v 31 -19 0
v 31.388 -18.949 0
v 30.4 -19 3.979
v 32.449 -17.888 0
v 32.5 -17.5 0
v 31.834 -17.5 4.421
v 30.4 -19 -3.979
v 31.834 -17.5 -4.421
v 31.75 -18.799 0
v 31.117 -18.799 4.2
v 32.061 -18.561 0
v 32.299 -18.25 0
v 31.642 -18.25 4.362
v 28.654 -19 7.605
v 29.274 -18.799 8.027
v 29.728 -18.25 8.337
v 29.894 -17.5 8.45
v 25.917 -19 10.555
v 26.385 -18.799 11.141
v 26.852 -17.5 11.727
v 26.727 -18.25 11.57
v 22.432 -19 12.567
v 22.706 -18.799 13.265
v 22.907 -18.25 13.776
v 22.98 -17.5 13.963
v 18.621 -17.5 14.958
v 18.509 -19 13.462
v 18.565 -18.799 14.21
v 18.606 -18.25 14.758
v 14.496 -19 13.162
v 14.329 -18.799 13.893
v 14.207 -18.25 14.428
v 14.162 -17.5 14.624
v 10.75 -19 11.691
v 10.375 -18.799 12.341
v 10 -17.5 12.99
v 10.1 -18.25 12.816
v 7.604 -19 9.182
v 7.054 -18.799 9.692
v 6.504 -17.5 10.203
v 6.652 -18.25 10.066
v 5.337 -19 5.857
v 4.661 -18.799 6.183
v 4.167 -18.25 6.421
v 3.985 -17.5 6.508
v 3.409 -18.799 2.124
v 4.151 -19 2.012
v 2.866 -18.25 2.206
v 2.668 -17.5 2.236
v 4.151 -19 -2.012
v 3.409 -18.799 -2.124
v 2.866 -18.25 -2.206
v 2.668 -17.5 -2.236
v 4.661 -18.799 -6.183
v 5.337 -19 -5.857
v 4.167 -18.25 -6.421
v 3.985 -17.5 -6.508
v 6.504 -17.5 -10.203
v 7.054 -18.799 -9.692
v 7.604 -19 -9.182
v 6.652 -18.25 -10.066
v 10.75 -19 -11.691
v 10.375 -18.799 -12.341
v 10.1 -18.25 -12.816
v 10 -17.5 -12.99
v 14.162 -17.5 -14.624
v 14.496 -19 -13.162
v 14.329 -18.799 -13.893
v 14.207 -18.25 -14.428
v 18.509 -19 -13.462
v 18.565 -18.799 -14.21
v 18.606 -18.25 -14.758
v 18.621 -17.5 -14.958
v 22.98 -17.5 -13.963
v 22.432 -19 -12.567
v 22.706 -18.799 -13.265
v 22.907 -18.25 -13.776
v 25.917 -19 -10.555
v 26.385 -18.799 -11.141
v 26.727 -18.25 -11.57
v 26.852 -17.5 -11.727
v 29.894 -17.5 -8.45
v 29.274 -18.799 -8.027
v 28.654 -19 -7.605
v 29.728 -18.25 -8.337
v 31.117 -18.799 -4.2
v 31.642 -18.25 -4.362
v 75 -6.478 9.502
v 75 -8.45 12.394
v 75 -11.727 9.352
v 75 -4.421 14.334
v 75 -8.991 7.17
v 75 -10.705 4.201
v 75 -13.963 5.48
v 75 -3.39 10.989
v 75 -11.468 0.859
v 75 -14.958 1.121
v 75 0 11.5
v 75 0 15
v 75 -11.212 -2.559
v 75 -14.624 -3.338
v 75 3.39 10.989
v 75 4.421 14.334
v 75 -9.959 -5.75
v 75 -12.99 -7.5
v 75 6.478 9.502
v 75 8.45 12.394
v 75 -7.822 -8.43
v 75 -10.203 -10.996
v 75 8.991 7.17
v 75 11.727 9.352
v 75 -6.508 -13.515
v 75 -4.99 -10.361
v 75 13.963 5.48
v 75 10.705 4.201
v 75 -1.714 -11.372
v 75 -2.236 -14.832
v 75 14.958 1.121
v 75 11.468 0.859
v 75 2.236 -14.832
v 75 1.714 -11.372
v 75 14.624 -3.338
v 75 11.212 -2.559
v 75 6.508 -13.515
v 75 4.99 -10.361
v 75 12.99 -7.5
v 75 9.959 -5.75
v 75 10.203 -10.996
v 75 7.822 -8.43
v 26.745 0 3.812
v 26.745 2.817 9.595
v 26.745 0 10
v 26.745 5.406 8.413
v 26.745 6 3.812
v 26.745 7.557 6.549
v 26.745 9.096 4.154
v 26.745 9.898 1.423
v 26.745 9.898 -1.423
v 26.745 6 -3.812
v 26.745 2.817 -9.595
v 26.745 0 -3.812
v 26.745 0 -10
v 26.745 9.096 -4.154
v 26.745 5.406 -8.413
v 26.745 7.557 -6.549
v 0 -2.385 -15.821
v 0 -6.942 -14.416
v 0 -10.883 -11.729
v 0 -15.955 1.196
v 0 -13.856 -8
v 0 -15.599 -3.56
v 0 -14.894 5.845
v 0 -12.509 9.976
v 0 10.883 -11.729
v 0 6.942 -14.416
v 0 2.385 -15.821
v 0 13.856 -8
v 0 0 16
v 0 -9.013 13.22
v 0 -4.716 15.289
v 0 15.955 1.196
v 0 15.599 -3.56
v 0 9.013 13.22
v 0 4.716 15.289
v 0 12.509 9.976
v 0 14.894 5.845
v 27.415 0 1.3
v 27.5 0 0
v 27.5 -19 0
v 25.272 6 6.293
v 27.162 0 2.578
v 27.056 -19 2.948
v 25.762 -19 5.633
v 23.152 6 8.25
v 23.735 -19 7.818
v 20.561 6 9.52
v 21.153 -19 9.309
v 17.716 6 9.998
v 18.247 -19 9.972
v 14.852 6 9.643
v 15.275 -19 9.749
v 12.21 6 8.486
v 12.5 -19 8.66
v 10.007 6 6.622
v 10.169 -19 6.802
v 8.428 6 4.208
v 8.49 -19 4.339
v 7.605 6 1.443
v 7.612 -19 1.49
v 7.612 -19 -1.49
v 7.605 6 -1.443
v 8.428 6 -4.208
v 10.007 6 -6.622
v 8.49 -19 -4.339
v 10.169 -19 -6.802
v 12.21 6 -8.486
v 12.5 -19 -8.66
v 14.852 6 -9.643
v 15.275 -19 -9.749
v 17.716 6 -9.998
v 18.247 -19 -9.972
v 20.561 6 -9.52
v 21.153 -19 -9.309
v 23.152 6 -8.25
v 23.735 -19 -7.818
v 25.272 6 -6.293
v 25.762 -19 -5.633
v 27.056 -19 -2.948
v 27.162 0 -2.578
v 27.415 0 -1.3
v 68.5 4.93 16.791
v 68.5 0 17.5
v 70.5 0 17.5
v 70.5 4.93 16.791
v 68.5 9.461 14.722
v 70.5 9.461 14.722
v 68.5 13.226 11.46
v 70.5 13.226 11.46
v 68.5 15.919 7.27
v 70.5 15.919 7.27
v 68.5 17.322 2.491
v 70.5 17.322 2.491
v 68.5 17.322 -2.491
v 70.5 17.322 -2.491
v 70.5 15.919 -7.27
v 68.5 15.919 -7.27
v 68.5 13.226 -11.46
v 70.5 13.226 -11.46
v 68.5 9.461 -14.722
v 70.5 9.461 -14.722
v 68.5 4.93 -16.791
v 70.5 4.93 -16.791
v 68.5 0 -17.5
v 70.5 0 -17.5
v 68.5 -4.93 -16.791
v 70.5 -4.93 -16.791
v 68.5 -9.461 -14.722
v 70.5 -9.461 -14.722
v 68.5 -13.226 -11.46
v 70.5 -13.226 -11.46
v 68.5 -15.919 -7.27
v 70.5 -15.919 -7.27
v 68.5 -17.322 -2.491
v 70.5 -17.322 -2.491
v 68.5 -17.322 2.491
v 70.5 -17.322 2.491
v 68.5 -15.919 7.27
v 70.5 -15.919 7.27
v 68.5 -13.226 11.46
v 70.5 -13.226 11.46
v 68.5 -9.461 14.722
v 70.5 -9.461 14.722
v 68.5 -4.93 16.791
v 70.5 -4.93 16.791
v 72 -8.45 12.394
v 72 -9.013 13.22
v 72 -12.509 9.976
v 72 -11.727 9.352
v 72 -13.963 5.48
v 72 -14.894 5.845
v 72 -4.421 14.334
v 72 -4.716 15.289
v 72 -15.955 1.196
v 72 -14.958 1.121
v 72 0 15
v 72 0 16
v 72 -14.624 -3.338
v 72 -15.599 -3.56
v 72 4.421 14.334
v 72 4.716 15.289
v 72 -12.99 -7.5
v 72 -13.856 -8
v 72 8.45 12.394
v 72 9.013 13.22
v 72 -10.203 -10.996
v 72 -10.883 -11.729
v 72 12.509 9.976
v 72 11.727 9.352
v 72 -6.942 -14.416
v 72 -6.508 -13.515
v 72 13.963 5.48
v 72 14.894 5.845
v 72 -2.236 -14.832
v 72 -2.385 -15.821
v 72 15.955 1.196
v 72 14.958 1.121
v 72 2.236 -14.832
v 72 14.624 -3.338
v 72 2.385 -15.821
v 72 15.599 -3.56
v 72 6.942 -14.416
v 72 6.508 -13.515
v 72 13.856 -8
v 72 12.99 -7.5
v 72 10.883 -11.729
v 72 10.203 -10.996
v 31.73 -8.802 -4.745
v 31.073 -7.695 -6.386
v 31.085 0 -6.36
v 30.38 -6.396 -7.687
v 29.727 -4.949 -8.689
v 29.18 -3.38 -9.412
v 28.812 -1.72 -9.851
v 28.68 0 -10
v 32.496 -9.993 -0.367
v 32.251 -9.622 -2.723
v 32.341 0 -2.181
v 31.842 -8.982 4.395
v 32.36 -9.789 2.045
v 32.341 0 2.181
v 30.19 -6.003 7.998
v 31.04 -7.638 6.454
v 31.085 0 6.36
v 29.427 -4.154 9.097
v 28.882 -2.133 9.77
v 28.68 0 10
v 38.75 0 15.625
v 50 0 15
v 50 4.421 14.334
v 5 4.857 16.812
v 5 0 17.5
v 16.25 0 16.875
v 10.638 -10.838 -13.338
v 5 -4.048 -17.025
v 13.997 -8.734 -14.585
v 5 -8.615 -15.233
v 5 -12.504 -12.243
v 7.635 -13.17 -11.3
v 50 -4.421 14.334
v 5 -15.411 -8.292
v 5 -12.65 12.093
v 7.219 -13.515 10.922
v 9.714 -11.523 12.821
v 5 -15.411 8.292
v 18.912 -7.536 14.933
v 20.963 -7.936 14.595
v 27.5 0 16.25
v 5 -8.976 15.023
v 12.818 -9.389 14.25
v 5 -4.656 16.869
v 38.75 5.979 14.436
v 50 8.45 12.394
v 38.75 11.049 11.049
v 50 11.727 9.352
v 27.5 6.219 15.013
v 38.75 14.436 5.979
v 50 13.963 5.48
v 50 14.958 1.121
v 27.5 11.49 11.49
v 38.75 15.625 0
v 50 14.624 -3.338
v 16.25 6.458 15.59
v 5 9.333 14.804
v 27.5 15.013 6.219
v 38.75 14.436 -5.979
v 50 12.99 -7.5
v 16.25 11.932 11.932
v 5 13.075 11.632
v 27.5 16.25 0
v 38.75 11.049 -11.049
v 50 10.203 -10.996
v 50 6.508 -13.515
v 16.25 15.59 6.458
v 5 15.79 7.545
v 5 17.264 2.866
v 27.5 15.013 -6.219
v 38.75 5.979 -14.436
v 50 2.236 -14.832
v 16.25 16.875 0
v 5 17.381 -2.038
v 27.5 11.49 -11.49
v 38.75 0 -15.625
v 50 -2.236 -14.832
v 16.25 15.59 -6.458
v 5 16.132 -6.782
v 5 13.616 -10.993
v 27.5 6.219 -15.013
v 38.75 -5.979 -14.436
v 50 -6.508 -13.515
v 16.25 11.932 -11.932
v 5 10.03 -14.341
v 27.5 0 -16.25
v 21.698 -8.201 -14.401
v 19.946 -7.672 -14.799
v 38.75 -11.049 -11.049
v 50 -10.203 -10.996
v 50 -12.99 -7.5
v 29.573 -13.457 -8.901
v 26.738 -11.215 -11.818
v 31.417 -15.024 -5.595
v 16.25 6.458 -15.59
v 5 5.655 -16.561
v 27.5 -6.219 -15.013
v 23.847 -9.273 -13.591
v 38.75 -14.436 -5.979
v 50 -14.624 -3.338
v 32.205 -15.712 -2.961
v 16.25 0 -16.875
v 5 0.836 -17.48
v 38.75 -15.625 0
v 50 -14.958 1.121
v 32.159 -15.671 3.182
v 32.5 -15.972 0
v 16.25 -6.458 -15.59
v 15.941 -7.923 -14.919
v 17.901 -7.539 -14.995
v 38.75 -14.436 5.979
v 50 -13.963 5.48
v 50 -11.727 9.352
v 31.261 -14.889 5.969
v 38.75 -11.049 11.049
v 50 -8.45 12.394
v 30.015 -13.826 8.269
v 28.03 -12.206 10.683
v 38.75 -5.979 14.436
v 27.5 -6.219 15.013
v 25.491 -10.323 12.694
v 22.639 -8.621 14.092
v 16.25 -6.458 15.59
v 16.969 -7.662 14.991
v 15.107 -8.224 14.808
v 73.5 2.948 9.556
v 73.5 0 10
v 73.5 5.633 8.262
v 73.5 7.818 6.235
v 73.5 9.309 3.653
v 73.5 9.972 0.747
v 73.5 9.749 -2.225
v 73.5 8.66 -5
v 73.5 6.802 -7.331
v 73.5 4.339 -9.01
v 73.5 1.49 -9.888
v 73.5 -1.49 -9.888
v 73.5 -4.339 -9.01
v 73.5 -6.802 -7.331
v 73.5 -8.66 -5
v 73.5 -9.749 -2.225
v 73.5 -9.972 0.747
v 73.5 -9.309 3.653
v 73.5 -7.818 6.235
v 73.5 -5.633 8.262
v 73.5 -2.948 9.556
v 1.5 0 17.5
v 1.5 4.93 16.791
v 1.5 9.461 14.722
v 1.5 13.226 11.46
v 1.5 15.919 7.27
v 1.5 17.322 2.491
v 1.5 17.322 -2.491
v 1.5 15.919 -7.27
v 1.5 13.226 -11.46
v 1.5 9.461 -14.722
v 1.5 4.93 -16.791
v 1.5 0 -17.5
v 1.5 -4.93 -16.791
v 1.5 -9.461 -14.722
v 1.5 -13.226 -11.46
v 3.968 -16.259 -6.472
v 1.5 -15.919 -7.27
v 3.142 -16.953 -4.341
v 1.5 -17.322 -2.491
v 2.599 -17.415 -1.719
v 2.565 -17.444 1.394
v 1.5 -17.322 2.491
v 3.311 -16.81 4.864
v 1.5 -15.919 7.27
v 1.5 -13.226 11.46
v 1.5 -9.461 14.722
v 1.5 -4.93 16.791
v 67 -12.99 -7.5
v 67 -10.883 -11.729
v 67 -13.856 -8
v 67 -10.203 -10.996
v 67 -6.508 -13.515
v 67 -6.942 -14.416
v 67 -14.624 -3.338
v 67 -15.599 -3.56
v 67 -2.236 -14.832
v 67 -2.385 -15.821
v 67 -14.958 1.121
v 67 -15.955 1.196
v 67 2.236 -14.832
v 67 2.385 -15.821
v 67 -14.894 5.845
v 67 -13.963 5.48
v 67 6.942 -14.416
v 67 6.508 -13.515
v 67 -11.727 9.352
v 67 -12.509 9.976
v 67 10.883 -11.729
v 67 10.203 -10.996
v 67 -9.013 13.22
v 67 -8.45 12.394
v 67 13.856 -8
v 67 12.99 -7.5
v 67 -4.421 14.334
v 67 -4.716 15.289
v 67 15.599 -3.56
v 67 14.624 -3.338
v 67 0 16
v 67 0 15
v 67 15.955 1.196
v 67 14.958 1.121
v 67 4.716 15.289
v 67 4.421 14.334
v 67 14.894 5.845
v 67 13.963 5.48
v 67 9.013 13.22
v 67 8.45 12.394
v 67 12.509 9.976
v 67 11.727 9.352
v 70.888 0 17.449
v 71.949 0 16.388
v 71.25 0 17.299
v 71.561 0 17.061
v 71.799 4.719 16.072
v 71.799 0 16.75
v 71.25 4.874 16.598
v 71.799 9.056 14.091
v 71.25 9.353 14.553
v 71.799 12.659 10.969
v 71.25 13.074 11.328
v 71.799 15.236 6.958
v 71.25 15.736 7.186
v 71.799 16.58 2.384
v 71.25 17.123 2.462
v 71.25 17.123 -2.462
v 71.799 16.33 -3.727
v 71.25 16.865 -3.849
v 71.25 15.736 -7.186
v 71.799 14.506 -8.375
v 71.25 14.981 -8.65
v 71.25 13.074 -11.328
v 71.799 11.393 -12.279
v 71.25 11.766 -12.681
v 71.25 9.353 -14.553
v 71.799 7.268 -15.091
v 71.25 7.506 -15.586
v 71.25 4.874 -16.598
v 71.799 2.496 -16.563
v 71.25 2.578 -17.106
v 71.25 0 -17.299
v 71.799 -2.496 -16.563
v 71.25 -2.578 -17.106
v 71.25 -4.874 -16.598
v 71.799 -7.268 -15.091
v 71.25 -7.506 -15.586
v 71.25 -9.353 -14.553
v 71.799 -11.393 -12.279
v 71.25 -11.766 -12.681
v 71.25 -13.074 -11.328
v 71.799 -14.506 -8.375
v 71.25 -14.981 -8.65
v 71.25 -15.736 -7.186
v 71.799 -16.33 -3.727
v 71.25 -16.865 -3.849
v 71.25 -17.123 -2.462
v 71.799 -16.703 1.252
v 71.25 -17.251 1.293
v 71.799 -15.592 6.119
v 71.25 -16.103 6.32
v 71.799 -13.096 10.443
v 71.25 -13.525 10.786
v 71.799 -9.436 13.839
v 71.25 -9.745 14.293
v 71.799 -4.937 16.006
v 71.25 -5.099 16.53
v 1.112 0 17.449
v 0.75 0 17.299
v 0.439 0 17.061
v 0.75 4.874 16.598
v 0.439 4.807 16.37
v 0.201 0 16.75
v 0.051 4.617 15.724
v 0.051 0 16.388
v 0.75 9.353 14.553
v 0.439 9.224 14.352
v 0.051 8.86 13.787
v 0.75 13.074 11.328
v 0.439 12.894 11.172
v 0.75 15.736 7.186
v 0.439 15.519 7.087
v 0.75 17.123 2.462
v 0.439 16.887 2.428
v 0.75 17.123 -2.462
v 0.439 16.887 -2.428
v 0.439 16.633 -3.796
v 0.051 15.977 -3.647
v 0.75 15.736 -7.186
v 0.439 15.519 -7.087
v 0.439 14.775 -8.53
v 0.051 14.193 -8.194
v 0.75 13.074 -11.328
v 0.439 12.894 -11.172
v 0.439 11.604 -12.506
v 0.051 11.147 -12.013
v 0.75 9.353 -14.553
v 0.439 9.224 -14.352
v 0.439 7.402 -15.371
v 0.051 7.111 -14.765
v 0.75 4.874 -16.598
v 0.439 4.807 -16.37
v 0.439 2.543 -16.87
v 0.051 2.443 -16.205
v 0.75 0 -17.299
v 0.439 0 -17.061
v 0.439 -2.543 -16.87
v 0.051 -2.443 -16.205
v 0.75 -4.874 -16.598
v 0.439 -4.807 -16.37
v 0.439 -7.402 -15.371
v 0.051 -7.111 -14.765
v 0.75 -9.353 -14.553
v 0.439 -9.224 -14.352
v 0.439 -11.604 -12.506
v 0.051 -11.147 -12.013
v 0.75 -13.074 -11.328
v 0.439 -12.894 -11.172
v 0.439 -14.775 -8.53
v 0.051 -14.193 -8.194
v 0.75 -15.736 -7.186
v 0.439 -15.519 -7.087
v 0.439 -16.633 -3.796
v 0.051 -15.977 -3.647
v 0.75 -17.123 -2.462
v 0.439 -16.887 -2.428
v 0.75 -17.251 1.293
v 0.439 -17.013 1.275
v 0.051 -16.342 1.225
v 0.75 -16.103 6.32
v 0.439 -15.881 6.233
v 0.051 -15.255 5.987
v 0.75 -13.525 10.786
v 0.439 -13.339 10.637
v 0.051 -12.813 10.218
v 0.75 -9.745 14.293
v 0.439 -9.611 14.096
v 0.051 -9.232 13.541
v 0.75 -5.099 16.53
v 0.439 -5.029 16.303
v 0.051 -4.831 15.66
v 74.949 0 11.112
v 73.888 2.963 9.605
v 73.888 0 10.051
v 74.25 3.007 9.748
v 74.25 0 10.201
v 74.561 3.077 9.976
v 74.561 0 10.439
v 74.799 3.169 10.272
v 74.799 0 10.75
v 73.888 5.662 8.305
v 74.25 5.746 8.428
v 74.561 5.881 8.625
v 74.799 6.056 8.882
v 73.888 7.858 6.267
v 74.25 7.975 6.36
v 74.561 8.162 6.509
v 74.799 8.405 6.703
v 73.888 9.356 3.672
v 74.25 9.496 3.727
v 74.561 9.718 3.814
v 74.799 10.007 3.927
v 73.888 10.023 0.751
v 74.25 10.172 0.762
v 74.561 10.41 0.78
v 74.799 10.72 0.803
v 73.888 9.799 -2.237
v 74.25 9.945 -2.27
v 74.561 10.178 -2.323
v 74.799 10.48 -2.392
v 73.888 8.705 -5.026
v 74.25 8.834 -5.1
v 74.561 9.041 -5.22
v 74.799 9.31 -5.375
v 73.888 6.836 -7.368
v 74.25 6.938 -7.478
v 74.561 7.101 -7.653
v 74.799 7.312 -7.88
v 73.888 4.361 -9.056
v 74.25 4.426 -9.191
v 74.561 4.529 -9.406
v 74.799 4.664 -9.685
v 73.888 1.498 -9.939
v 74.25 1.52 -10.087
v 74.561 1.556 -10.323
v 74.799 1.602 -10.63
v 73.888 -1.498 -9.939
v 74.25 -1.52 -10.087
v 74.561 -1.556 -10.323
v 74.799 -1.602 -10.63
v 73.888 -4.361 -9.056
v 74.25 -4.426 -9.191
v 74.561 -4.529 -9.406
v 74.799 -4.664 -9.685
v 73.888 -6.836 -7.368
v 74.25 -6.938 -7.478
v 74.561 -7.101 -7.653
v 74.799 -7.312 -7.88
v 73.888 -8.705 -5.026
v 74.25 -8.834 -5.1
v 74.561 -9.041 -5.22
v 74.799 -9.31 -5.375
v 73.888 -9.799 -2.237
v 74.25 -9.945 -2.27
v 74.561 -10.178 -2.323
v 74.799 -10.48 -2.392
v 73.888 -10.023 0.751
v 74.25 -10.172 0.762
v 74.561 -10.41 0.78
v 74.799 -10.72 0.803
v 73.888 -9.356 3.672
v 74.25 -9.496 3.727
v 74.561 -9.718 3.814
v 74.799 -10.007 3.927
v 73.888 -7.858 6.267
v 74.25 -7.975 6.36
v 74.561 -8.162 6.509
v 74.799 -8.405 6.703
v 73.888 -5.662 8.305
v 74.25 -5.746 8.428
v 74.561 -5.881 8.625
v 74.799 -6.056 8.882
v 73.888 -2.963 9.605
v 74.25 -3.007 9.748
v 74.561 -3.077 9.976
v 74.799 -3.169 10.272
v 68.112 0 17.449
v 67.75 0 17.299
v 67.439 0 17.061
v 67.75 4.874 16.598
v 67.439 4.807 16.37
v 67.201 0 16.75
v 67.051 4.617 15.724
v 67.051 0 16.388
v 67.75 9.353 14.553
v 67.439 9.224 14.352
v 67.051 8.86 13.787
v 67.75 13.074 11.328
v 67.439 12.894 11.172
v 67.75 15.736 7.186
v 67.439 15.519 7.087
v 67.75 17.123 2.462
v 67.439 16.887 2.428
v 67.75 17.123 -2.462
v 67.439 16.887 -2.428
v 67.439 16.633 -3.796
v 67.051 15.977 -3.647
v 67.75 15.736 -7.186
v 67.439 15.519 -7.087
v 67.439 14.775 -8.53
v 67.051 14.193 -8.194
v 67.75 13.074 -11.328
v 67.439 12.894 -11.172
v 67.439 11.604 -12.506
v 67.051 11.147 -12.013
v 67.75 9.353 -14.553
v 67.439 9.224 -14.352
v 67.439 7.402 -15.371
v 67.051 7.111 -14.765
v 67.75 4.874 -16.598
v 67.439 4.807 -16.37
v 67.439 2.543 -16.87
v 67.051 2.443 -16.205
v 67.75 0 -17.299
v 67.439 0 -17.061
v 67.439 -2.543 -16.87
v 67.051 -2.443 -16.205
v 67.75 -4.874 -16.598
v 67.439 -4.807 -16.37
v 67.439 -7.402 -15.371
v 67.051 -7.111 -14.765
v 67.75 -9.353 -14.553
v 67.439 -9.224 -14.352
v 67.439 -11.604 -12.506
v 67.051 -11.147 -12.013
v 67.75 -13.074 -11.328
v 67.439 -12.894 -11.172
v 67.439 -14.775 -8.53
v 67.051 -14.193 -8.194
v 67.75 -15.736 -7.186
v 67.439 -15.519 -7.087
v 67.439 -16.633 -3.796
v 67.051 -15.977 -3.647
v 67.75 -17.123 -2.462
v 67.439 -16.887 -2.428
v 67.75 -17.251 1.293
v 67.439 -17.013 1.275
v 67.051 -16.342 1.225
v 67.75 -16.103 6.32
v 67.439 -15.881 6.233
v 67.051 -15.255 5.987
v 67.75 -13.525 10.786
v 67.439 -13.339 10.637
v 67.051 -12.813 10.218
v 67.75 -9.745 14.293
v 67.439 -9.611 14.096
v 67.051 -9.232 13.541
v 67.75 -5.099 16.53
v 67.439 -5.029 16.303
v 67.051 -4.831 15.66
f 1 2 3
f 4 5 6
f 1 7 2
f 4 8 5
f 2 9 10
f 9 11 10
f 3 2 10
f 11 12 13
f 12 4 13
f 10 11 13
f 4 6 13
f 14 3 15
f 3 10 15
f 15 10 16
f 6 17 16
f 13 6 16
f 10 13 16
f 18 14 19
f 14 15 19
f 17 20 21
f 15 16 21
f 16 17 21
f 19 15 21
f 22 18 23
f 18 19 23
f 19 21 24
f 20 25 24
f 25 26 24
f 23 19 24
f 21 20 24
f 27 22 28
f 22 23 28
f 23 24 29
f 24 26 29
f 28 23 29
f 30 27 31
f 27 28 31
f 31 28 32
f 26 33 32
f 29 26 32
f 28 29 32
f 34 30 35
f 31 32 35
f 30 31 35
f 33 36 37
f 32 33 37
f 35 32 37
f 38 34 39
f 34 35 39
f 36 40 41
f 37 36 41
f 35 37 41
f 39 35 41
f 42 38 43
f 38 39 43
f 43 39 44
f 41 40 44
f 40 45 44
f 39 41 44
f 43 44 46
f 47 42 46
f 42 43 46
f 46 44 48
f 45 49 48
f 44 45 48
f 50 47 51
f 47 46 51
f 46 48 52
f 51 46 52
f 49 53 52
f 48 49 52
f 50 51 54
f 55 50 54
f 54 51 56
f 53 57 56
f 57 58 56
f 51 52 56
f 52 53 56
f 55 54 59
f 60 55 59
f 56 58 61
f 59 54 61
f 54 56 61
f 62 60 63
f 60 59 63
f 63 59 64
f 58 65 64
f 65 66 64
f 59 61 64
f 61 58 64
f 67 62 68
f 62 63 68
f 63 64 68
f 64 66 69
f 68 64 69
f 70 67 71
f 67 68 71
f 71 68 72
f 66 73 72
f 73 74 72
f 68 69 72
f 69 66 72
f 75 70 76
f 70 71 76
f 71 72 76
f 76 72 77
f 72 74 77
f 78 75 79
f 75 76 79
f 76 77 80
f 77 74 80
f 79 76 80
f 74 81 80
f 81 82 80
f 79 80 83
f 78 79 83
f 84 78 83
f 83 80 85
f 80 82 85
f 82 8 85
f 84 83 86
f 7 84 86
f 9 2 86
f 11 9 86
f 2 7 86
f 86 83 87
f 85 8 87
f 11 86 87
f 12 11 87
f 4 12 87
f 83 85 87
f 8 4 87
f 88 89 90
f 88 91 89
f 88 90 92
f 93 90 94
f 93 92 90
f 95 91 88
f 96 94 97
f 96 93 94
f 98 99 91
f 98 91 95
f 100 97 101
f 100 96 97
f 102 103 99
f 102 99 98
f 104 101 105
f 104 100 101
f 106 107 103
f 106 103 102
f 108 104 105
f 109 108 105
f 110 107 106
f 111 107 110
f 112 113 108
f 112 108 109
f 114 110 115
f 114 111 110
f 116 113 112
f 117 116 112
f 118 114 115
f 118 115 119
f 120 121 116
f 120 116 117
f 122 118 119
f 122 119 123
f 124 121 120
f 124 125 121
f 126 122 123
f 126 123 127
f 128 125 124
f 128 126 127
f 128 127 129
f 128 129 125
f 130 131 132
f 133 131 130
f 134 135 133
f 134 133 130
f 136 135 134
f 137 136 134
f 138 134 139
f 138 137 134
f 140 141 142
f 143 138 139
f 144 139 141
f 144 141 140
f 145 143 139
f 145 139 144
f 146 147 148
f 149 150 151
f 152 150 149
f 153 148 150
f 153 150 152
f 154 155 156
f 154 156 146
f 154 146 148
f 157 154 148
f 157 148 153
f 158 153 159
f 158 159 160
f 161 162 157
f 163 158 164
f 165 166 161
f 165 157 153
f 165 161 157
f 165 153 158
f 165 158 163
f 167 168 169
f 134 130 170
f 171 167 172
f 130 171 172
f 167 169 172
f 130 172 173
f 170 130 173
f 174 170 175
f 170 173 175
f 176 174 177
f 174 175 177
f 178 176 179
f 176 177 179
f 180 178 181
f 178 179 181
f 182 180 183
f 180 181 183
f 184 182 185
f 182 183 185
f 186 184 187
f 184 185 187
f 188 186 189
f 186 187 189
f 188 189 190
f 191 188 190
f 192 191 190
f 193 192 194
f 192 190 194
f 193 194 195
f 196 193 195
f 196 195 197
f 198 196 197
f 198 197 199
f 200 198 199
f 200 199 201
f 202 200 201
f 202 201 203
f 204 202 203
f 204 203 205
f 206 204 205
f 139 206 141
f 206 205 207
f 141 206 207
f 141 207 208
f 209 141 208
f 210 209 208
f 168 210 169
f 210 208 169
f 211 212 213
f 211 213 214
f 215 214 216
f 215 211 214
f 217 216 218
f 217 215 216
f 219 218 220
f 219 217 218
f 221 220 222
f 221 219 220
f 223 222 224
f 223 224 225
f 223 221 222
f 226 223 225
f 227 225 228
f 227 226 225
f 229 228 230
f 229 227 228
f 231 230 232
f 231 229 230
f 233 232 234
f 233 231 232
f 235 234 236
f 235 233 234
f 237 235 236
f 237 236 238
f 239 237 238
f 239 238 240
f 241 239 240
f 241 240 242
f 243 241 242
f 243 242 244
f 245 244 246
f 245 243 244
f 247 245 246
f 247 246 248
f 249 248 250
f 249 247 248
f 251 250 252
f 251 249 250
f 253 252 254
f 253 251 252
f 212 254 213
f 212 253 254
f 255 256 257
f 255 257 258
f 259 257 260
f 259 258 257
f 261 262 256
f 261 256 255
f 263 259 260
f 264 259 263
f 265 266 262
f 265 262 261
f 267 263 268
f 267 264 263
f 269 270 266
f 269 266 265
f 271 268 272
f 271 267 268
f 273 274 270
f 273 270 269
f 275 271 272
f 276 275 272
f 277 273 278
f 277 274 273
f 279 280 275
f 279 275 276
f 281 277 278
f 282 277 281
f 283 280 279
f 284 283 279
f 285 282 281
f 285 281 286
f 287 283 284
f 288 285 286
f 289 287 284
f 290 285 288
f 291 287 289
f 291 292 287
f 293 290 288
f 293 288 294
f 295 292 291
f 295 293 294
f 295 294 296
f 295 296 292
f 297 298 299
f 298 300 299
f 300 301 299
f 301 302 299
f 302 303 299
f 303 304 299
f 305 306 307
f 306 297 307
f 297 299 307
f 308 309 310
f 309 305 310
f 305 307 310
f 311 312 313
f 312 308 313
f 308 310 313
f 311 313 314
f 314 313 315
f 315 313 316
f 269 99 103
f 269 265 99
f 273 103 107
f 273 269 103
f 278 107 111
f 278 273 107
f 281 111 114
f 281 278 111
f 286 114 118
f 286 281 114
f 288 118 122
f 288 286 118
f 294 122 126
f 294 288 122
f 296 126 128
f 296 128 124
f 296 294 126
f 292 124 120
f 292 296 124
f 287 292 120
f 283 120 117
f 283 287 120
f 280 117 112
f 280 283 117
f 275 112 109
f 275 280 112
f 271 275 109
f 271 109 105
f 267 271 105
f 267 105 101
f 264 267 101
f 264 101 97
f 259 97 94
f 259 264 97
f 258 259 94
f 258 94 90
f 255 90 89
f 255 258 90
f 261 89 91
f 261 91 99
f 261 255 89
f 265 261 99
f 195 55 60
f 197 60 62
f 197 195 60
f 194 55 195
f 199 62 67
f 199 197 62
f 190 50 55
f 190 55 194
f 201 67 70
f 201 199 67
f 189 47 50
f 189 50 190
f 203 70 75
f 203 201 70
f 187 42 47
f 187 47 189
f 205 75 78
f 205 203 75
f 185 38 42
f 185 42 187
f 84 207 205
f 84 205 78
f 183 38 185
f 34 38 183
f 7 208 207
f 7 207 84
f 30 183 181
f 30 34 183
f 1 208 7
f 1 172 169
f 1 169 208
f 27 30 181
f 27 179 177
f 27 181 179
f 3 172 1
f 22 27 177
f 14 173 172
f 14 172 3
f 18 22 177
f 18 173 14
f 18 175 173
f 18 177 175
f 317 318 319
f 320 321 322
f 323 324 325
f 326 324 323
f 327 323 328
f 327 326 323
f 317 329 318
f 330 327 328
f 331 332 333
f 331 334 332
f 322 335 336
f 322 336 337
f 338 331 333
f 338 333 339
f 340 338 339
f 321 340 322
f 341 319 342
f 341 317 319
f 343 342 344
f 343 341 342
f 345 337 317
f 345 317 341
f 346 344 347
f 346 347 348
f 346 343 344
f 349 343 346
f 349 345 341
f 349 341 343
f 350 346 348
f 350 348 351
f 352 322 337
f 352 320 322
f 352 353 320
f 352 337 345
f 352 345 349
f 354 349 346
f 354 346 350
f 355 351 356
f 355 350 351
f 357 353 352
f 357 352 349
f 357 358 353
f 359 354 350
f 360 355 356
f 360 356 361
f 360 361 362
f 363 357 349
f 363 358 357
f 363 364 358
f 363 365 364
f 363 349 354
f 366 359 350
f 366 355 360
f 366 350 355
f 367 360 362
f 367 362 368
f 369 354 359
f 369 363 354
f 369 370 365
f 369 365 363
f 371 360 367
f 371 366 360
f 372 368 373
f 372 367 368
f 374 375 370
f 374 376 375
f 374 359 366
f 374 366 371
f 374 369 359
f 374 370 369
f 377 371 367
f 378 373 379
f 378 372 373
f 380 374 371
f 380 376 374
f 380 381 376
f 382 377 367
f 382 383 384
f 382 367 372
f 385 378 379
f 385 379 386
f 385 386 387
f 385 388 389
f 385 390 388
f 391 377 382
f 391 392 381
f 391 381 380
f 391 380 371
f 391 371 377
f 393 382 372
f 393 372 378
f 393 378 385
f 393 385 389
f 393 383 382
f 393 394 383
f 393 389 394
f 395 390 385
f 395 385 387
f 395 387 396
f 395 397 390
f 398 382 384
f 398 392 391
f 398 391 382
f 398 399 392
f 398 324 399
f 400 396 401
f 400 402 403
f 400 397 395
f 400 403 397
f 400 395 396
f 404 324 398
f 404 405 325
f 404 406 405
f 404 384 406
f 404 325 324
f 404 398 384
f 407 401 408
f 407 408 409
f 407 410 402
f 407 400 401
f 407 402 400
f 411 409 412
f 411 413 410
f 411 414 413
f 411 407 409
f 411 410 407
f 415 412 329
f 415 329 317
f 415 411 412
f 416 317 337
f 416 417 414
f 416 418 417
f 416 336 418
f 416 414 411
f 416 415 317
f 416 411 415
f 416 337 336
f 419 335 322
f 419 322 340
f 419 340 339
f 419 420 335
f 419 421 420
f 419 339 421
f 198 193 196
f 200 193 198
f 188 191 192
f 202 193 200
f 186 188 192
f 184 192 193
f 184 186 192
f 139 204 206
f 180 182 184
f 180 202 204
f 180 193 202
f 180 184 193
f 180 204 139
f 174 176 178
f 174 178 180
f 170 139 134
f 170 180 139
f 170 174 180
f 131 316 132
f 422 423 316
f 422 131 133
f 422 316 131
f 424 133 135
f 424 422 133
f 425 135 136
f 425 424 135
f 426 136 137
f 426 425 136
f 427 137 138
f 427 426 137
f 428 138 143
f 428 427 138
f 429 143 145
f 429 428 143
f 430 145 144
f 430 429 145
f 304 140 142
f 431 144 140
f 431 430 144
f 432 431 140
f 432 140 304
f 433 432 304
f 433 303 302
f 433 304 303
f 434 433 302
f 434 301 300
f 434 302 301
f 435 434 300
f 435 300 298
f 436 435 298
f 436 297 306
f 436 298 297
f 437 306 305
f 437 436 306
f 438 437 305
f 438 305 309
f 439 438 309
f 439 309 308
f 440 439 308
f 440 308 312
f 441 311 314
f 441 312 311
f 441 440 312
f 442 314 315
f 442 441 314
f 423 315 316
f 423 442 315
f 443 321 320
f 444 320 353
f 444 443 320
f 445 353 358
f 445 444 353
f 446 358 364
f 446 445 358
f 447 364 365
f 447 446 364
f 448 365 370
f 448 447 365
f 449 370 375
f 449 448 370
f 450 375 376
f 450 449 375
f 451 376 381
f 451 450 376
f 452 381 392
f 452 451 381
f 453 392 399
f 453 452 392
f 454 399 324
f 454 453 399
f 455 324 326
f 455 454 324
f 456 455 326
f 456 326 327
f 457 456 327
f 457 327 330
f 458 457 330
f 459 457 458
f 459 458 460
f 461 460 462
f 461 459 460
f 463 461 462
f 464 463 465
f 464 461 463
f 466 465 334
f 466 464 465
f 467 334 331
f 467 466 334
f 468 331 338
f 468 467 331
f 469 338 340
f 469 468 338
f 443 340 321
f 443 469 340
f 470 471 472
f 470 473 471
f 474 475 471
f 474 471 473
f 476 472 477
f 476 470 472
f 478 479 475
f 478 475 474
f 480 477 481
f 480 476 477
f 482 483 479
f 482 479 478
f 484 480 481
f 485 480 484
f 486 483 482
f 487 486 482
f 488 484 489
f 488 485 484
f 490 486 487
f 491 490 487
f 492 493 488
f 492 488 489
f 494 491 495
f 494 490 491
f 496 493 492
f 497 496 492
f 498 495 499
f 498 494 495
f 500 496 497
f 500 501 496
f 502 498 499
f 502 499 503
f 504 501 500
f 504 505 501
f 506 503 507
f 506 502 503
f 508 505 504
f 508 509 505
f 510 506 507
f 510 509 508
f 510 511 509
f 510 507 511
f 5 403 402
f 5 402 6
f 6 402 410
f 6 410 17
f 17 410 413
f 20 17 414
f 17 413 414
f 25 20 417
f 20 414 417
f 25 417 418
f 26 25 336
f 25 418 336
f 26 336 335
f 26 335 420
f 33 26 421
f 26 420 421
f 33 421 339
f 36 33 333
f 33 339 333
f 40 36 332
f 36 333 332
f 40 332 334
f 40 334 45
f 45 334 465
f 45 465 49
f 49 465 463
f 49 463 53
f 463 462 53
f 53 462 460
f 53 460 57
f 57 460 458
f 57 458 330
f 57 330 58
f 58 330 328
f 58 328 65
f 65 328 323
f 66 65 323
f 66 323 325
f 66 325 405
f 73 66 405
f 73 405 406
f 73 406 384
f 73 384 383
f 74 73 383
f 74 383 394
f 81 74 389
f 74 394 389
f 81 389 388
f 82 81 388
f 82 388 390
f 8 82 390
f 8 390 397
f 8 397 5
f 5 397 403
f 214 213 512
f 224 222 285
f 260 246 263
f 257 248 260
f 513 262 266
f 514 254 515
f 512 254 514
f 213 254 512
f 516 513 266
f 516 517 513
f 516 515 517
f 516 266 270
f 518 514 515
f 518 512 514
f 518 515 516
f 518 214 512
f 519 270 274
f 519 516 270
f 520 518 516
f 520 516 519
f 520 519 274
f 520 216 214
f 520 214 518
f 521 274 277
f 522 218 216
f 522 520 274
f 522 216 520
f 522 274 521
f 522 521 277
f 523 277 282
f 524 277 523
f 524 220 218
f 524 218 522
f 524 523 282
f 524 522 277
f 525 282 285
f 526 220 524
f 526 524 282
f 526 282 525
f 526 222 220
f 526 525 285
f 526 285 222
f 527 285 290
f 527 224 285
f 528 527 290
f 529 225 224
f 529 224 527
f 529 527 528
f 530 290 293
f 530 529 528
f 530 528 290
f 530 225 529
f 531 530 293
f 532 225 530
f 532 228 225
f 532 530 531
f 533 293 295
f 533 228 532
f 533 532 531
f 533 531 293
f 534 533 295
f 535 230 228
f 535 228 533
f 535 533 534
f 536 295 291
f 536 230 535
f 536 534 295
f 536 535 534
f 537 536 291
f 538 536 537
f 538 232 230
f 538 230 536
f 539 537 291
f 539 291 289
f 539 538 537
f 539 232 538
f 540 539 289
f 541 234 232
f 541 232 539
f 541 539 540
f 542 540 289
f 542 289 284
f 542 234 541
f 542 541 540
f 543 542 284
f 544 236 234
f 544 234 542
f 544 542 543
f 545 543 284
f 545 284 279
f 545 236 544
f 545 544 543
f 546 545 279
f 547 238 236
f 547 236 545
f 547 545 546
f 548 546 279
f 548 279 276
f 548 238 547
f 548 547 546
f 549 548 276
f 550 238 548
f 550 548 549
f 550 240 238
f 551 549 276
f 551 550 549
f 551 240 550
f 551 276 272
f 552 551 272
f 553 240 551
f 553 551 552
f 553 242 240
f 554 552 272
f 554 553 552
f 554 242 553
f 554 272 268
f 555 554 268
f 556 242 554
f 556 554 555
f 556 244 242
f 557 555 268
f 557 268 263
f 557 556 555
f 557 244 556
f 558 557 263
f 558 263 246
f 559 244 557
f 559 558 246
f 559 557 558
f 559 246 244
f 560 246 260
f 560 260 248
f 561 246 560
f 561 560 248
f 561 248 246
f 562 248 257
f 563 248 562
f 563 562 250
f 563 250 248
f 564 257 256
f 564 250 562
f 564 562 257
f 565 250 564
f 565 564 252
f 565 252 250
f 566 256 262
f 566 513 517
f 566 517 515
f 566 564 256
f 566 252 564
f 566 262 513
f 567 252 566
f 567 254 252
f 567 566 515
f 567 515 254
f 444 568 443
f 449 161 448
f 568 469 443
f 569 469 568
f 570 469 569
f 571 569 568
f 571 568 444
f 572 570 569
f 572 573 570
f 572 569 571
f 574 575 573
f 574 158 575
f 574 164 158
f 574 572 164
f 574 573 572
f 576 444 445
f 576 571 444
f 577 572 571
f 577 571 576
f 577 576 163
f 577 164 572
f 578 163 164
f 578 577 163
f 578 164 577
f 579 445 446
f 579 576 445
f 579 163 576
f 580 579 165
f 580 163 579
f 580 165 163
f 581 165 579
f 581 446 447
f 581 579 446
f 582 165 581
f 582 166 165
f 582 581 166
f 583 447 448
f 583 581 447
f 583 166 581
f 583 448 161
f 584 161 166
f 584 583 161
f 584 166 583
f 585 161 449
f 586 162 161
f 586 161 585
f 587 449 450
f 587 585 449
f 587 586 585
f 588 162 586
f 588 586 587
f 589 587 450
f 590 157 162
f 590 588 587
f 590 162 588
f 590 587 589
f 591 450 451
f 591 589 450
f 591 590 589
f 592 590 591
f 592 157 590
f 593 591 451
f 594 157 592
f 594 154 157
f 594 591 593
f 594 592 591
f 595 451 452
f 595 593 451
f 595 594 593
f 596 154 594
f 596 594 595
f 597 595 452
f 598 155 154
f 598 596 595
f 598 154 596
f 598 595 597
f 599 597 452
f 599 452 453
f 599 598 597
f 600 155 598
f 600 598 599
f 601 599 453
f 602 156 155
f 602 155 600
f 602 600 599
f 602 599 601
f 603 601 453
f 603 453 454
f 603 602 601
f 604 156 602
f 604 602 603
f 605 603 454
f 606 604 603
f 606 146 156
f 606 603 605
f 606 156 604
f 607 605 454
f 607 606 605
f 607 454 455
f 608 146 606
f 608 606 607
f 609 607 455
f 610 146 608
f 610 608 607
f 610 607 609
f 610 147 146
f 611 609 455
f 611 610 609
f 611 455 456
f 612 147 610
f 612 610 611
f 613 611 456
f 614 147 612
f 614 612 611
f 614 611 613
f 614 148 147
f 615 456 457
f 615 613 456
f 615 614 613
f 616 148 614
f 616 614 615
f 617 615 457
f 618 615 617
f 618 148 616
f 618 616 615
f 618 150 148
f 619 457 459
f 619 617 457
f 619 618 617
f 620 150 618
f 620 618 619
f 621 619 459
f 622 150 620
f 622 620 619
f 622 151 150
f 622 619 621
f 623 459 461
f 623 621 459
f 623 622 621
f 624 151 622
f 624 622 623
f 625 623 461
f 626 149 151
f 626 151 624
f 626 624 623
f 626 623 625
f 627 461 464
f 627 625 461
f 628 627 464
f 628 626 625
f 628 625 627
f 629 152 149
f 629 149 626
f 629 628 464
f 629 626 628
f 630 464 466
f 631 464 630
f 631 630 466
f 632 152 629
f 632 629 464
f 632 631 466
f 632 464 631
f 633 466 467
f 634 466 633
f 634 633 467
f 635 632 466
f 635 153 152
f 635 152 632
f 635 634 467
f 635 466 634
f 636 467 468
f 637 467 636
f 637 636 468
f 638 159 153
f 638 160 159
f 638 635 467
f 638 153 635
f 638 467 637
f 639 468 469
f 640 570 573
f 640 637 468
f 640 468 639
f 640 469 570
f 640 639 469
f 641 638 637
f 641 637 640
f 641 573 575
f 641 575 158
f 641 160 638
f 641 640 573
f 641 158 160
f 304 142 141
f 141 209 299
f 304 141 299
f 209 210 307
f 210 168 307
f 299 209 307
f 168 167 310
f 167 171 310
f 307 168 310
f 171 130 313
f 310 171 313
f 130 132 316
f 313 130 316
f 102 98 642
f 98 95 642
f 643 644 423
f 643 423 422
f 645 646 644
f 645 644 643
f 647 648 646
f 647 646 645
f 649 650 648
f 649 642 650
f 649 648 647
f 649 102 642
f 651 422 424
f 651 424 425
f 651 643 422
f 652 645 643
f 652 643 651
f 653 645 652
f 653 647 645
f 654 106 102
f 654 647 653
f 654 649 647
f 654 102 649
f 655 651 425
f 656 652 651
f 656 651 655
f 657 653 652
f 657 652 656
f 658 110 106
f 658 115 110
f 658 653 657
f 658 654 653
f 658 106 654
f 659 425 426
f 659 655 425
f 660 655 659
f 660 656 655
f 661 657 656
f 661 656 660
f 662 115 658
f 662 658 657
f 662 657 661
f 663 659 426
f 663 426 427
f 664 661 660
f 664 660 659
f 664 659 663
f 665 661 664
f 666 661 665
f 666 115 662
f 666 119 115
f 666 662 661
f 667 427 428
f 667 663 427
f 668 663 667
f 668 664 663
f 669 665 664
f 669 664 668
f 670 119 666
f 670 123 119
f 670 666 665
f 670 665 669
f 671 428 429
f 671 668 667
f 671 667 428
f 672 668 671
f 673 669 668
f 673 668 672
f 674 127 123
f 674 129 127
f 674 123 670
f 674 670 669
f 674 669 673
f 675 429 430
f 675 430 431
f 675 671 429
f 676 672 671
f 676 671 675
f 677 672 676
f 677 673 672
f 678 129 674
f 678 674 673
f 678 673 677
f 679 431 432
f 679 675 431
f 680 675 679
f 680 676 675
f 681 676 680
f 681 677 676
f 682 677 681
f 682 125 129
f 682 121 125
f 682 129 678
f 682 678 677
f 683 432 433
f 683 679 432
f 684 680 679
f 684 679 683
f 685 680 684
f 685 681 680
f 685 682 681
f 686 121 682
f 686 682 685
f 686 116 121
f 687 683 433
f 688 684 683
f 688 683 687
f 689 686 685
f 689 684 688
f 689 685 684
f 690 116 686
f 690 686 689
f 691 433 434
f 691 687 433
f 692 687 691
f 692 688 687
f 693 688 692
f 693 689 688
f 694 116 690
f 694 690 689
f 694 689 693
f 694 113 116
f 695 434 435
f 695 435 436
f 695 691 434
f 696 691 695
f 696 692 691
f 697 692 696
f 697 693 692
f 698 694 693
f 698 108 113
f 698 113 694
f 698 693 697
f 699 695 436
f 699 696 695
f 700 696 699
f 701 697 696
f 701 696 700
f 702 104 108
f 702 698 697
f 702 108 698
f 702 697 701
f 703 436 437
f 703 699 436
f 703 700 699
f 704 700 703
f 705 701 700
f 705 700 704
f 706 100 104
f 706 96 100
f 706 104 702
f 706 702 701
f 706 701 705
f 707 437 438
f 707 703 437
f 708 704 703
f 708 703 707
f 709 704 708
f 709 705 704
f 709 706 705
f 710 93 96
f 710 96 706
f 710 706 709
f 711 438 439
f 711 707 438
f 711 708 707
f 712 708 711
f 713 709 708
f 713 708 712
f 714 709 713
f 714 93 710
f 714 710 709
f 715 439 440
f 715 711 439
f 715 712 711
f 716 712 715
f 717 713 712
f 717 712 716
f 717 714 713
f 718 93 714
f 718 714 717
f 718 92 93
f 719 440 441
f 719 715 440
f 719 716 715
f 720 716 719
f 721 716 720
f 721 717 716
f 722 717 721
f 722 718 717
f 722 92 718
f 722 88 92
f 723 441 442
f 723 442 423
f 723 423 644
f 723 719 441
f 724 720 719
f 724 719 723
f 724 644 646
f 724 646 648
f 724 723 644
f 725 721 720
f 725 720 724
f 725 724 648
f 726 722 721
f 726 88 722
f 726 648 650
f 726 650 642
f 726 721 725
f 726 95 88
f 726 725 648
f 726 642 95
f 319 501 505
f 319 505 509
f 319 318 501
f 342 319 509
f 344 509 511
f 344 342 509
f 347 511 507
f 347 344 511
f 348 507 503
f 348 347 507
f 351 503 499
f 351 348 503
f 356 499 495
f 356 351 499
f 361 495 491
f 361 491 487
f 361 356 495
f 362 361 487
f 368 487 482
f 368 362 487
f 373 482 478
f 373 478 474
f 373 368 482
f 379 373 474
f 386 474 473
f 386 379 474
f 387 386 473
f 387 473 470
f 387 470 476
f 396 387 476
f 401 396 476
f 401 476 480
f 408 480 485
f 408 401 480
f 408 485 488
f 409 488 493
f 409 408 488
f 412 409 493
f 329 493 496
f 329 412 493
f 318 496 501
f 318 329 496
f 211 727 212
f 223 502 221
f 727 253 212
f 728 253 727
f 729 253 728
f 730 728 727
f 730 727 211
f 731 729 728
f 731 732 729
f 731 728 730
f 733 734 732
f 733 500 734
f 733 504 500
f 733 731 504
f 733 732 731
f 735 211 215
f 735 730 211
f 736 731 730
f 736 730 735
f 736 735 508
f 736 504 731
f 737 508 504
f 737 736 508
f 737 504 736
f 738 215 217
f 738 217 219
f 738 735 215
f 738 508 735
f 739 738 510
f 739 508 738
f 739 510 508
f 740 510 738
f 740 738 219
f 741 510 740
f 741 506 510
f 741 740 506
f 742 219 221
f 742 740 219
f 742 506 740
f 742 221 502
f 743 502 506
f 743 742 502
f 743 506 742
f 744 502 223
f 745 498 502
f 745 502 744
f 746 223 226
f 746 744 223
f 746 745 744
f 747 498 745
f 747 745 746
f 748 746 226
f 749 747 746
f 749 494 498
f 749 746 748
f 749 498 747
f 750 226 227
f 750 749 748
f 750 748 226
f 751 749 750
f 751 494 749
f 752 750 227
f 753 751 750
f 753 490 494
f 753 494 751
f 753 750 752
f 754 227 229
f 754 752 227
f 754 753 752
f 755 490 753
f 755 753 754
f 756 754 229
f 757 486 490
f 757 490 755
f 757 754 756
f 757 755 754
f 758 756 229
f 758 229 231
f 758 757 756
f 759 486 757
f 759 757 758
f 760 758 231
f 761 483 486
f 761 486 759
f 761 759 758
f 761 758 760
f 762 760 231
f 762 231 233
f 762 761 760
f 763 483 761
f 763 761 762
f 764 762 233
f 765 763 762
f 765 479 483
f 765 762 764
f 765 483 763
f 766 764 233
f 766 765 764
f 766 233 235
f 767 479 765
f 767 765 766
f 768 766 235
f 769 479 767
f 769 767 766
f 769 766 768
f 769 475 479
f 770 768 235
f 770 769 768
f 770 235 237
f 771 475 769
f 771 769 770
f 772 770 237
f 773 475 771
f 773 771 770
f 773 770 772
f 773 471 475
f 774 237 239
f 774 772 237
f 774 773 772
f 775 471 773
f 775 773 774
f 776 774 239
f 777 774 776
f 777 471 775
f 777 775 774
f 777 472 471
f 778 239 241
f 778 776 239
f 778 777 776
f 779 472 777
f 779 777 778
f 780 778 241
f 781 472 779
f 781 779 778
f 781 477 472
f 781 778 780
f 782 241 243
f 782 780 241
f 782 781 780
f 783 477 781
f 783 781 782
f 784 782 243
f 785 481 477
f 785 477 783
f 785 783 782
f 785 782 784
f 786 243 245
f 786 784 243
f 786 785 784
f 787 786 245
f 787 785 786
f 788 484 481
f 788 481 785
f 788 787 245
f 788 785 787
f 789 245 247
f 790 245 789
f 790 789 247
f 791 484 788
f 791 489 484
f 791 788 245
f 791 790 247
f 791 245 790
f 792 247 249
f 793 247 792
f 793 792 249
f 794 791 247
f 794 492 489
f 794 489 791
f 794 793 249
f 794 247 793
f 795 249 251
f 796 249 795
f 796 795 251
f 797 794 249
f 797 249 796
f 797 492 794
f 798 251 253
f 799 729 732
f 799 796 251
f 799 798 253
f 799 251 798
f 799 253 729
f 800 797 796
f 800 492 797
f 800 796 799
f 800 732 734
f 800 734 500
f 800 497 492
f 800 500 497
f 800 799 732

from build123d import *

# Parameters (mm, degrees)
F2_R     = 15
F3_DEPTH = 19
F4_R     = 10
F5_DEPTH = 25
F6_R     = 1.5


with BuildPart() as f1:
    # F0 (on Front) → F1 (revolve)
    with BuildSketch(Plane.XZ):
        Polygon((0, 17.5), (0, 0), (26.744785, 0), (26.744785, 10), (75, 10), (75, 15), (72, 15), (72, 17.5), (67, 17.5), (67, 15), (50, 15), (5, 17.5), align=None)
    revolve(axis=Axis((13.372393, 0, 0), (-1, 0, 0)))

    # F2 (on Front) → F3 (join)
    with BuildSketch(Plane.XZ):
        with Locations((17.5, 0)):
            Circle(F2_R)
    extrude(amount=F3_DEPTH)

    # F4 (on face) → F5 (cut)
    with BuildSketch(Plane.XZ.offset(19)):
        with Locations((17.5, 0)):
            Circle(F4_R)
    extrude(amount=-F5_DEPTH, mode=Mode.SUBTRACT)

    # F6
    f6_edges = [f1.edges().sort_by_distance(p)[0] for p in [
        (2.5, -19, 0),
        (0, 0, -17.5),
        (67, 0, -17.5),
        (72, 0, -17.5),
        (75, 0, -10),
    ]]
    fillet(f6_edges, radius=F6_R)


solid = f1.part
